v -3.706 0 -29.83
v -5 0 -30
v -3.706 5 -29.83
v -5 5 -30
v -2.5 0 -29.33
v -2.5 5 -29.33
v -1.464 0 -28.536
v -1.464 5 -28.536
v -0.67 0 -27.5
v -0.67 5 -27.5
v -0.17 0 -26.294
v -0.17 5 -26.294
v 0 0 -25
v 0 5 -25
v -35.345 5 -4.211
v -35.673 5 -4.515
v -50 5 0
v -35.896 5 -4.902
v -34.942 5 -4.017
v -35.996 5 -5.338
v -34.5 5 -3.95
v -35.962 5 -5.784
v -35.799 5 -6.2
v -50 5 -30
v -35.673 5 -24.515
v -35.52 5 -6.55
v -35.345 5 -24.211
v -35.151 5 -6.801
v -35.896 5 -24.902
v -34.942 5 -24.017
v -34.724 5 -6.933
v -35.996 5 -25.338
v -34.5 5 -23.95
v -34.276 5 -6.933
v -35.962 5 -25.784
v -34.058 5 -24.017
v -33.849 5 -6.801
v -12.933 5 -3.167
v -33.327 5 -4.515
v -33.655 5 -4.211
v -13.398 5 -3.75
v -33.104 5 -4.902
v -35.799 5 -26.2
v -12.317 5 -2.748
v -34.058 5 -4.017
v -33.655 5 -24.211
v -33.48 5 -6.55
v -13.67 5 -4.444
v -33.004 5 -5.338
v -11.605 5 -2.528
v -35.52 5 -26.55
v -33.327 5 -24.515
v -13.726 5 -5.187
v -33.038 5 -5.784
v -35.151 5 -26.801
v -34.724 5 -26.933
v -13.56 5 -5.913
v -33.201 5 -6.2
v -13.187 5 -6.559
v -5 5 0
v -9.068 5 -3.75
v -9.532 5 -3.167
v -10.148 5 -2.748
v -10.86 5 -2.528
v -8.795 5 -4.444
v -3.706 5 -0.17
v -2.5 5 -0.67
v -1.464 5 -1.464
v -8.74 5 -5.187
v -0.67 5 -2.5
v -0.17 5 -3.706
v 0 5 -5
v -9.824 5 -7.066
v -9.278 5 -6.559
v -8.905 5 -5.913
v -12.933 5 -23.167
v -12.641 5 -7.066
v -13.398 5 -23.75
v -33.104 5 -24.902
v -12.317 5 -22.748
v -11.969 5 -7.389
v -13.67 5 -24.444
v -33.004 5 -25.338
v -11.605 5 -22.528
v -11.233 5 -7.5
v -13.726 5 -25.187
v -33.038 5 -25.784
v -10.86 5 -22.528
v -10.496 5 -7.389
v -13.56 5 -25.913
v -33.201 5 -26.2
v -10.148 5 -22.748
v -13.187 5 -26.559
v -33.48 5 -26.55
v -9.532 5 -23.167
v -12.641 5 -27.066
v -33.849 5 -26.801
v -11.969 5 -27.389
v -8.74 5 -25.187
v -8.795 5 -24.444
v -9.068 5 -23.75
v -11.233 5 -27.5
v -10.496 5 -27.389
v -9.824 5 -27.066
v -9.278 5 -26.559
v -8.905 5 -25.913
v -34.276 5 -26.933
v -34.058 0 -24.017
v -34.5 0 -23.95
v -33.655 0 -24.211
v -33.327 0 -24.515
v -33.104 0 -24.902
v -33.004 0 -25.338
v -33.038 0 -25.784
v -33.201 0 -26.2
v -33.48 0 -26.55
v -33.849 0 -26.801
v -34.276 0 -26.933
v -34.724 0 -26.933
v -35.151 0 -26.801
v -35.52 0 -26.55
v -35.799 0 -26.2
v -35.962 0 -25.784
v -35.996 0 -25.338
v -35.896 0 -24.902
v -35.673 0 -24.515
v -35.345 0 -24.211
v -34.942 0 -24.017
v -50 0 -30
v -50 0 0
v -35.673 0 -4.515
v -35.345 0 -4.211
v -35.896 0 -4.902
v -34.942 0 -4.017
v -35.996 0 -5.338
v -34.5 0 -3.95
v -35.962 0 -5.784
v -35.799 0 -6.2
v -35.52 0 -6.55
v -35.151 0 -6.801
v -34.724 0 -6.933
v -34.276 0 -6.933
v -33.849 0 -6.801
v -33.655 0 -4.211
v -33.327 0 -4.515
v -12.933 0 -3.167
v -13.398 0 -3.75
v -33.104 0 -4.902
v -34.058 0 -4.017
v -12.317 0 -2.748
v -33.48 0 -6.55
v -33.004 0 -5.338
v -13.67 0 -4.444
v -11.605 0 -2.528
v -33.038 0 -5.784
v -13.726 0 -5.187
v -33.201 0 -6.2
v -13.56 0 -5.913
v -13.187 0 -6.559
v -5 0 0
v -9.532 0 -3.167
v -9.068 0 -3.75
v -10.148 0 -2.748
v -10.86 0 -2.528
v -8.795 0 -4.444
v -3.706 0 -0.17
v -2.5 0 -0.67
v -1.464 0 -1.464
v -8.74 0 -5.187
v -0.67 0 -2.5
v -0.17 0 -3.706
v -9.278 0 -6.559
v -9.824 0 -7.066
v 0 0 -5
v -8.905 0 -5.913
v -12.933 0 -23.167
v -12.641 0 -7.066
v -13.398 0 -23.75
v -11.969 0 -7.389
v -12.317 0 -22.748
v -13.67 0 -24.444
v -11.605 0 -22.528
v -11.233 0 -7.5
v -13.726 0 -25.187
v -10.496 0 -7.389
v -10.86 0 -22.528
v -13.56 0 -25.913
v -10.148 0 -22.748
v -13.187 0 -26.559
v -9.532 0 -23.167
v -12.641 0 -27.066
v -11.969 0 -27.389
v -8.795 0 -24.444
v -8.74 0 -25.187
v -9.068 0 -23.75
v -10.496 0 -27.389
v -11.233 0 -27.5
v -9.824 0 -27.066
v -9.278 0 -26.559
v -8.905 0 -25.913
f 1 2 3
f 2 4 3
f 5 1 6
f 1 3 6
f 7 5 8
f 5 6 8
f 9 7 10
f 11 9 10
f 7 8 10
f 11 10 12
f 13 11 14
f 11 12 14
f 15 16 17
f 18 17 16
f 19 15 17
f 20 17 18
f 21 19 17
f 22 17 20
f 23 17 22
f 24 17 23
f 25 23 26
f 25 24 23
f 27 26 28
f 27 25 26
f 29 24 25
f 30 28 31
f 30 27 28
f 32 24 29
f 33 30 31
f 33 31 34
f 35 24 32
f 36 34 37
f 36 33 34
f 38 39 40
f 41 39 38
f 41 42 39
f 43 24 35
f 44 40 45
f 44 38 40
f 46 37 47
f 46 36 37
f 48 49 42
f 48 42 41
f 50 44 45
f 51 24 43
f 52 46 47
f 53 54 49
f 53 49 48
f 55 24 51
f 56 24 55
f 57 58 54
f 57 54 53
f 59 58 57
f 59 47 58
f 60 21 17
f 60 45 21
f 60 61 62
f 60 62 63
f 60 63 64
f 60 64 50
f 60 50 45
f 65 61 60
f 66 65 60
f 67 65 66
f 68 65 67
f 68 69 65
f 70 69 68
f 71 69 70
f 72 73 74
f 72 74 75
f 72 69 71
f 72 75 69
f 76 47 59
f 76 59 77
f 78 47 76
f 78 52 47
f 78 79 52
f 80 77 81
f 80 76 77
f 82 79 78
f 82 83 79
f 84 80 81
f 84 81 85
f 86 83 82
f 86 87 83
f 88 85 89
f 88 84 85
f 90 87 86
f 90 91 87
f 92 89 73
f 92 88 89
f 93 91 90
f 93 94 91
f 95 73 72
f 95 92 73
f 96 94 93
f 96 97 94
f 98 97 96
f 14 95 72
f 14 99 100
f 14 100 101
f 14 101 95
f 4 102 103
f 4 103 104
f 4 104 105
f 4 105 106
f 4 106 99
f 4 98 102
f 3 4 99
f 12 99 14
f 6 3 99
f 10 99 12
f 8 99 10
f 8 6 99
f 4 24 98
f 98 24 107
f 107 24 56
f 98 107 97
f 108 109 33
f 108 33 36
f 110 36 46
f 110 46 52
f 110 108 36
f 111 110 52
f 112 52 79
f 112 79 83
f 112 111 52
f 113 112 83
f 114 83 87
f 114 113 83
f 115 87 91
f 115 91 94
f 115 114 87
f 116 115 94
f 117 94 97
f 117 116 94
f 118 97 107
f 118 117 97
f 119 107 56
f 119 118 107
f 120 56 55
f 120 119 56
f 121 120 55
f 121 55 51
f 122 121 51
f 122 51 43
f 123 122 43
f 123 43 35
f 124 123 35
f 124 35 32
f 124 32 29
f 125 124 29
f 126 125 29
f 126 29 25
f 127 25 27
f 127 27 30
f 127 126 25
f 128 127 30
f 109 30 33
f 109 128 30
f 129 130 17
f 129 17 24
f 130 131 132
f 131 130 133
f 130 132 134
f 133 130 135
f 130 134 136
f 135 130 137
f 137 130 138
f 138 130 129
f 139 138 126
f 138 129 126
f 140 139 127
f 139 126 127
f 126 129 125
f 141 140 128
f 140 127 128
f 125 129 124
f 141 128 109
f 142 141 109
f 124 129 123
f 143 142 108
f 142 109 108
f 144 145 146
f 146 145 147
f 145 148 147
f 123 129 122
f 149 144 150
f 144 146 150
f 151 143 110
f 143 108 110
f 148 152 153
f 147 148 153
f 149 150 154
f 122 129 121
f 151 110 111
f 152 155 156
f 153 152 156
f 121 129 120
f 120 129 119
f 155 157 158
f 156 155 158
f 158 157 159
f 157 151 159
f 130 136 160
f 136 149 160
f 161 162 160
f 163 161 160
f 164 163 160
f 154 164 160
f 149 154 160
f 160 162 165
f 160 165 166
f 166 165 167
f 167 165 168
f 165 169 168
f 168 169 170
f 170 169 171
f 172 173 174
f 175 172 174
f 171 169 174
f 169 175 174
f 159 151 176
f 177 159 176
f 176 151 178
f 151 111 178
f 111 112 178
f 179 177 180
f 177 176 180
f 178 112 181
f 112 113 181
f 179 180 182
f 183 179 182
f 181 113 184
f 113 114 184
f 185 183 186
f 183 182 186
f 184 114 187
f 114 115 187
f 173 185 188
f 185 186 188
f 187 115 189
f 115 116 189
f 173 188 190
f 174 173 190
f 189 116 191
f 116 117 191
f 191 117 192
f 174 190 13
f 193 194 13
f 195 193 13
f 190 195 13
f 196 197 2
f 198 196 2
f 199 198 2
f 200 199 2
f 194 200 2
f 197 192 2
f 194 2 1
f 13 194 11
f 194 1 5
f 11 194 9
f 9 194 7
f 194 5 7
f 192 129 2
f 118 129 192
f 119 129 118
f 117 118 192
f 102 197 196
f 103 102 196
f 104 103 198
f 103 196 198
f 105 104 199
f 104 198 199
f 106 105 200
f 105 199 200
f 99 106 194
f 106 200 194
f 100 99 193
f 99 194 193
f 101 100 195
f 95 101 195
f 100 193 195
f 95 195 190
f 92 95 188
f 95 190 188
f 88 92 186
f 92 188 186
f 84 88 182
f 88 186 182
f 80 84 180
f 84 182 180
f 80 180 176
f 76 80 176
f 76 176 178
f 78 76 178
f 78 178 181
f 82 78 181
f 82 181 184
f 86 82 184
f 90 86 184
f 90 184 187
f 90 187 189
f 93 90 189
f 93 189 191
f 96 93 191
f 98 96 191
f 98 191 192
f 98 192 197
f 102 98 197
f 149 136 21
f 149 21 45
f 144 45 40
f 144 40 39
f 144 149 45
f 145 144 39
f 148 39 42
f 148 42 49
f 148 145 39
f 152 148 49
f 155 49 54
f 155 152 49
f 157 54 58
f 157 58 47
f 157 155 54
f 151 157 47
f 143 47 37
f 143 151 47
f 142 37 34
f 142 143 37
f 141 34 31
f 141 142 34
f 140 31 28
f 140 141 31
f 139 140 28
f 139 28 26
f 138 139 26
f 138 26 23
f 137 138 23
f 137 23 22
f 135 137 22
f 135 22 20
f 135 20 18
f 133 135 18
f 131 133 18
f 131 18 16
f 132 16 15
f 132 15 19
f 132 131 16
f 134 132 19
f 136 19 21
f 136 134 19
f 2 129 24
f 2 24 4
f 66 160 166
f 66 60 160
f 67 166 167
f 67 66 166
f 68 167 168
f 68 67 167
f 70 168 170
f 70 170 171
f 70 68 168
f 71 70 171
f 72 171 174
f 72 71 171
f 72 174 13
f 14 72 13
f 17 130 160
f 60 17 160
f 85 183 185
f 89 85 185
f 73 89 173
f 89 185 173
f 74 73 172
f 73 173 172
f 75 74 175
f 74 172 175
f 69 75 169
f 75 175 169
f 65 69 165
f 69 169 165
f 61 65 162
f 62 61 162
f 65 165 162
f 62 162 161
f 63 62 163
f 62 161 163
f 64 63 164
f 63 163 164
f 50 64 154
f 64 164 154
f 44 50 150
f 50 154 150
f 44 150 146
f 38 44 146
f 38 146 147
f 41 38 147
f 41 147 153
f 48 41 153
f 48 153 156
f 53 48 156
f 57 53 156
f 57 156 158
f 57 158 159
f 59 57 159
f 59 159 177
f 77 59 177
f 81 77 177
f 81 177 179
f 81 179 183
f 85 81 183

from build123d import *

# Parameters (mm, degrees)
SKETCH1_W           = 50
SKETCH1_H           = 30
SKETCH1_R           = 1.5
BOSS_EXTRUDE1_DEPTH = 5
FILLET1_R           = 5
SKETCH2_R           = 2.5
CUT_EXTRUDE1_DEPTH  = 9


with BuildPart() as part:
    # Sketch1 → Boss-Extrude1 (new body)
    with BuildSketch(Plane(origin=(0, 0, 0), x_dir=(1, 0, 0), z_dir=(0, 1, 0))):
        with Locations((-25, 15)):
            Rectangle(SKETCH1_W, SKETCH1_H)
        with Locations(Location((-34.5, 5.45, 0), (0, 0, 270))):
            Circle(SKETCH1_R, mode=Mode.SUBTRACT)
        with Locations(Location((-34.5, 25.45, 0), (0, 0, 270))):
            Circle(SKETCH1_R, mode=Mode.SUBTRACT)
    extrude(amount=BOSS_EXTRUDE1_DEPTH)

    # Fillet1
    fillet1_edges = [part.edges().sort_by_distance(p)[0] for p in [
        (0, 2.5, 0),
        (0, 2.5, -30),
    ]]
    fillet(fillet1_edges, radius=FILLET1_R)

    # Sketch2 → Cut-Extrude1 (cut)
    with BuildSketch(Plane.XZ):
        with Locations(Location((-11.23257698, -5, 0), (0, 0, 270))):
            Circle(SKETCH2_R)
        with Locations(Location((-11.23257698, -25, 0), (0, 0, 270))):
            Circle(SKETCH2_R)
    extrude(amount=-CUT_EXTRUDE1_DEPTH, mode=Mode.SUBTRACT)


solid = part.part
